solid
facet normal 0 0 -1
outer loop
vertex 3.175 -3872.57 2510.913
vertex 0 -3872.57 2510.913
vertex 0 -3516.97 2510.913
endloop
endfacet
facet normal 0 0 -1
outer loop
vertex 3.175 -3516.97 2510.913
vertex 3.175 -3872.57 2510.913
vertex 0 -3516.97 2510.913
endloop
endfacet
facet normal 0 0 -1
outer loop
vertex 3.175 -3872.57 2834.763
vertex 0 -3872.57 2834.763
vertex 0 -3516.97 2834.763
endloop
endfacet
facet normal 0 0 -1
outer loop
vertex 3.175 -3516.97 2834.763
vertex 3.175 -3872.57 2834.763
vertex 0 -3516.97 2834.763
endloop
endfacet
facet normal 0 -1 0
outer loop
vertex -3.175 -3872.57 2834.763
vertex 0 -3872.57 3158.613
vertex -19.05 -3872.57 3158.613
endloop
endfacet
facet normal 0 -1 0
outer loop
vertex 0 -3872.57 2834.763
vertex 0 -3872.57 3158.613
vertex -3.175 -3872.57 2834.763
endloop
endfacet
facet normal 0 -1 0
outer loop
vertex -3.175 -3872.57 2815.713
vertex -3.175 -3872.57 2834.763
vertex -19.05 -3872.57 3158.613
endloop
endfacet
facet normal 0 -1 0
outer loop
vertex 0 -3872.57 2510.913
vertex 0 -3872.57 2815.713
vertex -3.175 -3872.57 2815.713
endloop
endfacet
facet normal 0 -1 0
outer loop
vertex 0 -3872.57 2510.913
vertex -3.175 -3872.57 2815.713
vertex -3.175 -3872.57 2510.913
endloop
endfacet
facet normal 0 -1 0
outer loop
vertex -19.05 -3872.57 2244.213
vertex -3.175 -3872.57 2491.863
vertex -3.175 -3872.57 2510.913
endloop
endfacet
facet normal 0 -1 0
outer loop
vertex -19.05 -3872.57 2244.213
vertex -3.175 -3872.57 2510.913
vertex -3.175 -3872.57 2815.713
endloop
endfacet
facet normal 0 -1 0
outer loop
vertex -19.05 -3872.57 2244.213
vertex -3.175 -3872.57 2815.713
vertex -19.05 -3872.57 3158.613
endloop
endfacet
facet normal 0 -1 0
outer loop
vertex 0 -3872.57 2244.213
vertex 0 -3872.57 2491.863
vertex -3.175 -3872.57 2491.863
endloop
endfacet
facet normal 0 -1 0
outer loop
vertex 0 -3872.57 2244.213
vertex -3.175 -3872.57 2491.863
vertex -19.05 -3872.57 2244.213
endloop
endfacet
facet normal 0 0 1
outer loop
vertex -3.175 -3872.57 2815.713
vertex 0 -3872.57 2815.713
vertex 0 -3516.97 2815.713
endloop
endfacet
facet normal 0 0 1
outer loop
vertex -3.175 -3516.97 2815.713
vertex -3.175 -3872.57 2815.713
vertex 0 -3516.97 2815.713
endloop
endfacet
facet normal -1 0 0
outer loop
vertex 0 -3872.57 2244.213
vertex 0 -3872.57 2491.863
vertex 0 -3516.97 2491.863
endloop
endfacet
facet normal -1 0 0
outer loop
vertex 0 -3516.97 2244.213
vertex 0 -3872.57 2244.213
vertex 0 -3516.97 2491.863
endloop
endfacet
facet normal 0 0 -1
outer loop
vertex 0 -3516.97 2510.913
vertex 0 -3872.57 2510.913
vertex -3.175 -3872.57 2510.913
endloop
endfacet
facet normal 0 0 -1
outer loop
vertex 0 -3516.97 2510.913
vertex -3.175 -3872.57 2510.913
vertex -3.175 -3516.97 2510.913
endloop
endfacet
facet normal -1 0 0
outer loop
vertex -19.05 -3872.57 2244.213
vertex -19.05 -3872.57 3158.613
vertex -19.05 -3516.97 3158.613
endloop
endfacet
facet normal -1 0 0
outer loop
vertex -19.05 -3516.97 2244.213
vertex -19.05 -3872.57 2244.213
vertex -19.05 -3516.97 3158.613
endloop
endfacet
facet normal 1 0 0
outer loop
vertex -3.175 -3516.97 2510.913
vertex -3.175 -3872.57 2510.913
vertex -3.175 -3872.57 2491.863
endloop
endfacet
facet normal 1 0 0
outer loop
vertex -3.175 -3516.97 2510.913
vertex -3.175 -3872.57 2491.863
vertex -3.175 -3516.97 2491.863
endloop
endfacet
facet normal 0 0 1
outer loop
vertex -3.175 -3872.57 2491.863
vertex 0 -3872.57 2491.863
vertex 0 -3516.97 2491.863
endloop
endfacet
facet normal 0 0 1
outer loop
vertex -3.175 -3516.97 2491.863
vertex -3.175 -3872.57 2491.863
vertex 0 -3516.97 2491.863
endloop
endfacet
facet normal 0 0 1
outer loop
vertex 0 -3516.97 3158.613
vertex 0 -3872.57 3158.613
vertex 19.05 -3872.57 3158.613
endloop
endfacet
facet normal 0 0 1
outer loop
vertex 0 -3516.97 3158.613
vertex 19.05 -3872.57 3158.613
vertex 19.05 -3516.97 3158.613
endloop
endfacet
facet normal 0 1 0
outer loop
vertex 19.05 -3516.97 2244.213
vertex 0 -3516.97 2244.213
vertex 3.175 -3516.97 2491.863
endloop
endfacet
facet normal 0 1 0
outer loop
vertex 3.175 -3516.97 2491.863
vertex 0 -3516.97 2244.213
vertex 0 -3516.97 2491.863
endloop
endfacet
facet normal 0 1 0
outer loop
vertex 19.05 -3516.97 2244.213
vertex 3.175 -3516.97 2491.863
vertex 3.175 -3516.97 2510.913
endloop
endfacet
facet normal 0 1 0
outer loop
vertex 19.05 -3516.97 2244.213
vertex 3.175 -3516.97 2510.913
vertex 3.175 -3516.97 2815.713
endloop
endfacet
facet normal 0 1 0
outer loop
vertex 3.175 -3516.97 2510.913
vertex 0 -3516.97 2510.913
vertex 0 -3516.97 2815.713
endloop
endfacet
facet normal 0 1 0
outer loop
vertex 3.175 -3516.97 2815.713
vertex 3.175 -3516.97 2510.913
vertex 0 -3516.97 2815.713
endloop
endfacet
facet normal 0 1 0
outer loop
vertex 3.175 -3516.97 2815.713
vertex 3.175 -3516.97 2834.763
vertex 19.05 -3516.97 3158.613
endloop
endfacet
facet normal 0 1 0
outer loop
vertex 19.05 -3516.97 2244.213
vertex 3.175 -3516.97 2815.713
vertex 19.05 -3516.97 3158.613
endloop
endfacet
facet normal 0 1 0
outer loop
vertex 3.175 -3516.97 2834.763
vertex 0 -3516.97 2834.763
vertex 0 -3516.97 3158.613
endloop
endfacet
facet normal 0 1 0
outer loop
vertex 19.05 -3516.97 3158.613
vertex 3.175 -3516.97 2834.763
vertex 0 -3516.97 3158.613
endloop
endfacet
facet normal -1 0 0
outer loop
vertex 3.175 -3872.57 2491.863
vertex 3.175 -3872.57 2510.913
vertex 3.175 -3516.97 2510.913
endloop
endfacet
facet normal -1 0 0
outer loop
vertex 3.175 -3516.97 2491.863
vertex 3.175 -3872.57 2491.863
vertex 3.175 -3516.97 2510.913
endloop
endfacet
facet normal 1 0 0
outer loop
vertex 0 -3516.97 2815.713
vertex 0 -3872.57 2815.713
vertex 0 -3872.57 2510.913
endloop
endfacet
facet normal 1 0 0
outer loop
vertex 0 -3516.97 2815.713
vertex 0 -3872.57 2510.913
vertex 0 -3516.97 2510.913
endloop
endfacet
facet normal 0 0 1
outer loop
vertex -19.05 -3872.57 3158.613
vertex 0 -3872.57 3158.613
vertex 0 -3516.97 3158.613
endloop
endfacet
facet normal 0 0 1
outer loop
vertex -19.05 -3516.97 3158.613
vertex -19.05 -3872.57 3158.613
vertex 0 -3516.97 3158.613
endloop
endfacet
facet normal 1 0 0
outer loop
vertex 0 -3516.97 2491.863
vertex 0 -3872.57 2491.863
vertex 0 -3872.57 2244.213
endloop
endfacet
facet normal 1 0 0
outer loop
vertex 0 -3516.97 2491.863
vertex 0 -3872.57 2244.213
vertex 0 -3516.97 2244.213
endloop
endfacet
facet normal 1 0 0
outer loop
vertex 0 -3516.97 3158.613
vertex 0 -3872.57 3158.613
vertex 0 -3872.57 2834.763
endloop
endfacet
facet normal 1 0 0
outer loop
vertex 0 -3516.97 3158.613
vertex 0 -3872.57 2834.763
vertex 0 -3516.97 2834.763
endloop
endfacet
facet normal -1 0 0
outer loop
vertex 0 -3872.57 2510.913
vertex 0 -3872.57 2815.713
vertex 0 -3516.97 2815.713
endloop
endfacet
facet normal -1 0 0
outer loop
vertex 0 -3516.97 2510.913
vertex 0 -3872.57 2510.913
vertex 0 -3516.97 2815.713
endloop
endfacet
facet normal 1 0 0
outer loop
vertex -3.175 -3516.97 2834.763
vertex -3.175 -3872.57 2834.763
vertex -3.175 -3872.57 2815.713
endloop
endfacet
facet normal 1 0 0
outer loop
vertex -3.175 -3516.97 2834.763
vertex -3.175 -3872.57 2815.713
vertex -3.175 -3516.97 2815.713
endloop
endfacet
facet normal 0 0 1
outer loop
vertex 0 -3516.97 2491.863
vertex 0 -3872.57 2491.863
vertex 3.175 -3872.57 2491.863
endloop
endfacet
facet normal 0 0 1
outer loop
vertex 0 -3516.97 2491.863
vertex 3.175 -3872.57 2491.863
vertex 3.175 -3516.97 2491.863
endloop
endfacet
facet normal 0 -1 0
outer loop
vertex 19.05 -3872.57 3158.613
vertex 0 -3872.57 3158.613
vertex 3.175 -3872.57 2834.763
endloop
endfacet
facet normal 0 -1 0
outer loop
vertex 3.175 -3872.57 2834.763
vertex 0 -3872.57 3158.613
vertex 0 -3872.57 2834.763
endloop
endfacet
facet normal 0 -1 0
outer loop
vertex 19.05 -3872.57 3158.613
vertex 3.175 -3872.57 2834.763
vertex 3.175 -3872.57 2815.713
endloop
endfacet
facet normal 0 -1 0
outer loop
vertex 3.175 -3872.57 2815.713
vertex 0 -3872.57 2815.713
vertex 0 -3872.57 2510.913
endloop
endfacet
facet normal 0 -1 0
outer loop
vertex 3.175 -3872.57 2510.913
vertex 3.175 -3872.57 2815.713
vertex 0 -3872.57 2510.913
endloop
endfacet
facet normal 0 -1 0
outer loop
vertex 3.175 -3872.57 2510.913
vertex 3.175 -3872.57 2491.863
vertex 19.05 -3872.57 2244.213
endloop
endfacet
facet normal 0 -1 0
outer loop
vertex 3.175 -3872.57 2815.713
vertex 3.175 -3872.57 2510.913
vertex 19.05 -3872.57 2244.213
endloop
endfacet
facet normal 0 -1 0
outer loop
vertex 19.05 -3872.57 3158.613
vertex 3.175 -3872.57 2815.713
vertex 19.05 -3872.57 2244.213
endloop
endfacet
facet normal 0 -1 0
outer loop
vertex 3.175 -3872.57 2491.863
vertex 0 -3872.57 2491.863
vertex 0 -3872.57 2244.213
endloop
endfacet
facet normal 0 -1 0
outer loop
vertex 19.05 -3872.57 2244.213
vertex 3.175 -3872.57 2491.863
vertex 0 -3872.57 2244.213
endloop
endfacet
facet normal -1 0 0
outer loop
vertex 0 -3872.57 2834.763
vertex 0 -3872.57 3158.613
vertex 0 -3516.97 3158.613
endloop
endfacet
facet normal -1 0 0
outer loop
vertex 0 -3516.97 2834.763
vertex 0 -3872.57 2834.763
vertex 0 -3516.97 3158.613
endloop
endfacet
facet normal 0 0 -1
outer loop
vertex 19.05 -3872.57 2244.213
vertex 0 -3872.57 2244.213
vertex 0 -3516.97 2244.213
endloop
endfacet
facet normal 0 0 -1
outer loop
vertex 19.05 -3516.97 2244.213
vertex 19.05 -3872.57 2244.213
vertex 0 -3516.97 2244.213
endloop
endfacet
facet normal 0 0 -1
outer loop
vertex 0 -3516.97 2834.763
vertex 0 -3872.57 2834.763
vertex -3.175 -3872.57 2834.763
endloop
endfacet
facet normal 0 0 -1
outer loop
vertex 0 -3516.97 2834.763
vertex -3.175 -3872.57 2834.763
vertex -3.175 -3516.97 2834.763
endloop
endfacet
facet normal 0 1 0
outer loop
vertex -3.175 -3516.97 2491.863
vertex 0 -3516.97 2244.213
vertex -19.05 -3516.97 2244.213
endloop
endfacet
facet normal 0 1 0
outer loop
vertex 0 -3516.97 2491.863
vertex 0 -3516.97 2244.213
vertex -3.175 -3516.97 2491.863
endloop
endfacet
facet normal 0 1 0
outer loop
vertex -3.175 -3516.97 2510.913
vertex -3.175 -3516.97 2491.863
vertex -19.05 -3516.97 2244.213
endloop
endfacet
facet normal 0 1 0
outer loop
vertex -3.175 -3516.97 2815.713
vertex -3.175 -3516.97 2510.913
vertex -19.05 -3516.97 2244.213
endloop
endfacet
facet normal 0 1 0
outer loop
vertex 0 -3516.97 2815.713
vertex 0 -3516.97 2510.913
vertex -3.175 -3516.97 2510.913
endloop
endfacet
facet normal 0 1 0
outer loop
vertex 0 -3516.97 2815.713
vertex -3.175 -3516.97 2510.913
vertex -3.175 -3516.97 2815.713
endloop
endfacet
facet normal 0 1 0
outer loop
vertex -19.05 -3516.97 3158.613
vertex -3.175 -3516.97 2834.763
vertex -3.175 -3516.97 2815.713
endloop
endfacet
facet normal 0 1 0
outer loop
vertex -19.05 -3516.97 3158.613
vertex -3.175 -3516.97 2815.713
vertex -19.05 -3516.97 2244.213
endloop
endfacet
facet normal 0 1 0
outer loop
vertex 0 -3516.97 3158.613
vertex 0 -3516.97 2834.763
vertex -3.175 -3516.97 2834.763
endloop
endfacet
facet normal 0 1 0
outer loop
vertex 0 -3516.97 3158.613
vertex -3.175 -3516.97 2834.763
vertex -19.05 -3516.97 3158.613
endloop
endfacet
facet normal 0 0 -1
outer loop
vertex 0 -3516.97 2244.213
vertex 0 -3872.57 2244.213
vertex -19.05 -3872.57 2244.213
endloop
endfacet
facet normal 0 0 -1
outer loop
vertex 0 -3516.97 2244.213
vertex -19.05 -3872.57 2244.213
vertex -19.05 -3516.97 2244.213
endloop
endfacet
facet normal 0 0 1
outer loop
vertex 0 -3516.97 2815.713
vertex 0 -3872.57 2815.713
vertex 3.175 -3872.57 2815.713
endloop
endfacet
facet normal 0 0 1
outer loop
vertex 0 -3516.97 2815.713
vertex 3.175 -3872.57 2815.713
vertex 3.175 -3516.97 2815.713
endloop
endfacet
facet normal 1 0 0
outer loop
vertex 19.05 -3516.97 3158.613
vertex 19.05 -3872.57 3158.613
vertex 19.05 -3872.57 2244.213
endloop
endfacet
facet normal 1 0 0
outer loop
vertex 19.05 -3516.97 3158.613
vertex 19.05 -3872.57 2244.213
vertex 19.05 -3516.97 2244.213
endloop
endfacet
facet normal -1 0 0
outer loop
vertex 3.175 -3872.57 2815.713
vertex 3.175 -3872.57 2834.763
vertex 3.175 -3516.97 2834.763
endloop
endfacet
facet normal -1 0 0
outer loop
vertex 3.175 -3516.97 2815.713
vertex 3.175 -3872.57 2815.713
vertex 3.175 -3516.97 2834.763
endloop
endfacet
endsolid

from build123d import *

# Parameters (mm, degrees)
F0_W     = 355.6
F0_H     = 323.85
F0_H_2   = 247.65
F0_H_3   = 304.8
F0_H_4   = 19.05
F1_DEPTH = 19.05
F2_DEPTH = 3.175


with BuildPart() as f1:
    # F0 (on Right) → F1 (new body)
    with BuildSketch(Plane.YZ):
        with Locations((-3694.770172, 2996.688328)):
            Rectangle(F0_W, F0_H)
        with Locations((-3694.770172, 2368.038328)):
            Rectangle(F0_W, F0_H_2)
        with Locations((-3694.770172, 2663.313328)):
            Rectangle(F0_W, F0_H_3)
        with Locations((-3694.770172, 2501.388328)):
            Rectangle(F0_W, F0_H_4)
        with Locations((-3694.770172, 2825.238328)):
            Rectangle(F0_W, F0_H_4)
    extrude(amount=F1_DEPTH)

    # F0 (on Right) → F2 (cut)
    with BuildSketch(Plane.YZ):
        with Locations((-3694.770172, 2825.238328)):
            Rectangle(F0_W, F0_H_4)
        with Locations((-3694.770172, 2501.388328)):
            Rectangle(F0_W, F0_H_4)
    extrude(amount=F2_DEPTH, mode=Mode.SUBTRACT)


with BuildPart() as f3_1:
    # F3: instance of F1
    add(f1.part.mirror(Plane.YZ))


solid = Compound([f1.part, f3_1.part])
